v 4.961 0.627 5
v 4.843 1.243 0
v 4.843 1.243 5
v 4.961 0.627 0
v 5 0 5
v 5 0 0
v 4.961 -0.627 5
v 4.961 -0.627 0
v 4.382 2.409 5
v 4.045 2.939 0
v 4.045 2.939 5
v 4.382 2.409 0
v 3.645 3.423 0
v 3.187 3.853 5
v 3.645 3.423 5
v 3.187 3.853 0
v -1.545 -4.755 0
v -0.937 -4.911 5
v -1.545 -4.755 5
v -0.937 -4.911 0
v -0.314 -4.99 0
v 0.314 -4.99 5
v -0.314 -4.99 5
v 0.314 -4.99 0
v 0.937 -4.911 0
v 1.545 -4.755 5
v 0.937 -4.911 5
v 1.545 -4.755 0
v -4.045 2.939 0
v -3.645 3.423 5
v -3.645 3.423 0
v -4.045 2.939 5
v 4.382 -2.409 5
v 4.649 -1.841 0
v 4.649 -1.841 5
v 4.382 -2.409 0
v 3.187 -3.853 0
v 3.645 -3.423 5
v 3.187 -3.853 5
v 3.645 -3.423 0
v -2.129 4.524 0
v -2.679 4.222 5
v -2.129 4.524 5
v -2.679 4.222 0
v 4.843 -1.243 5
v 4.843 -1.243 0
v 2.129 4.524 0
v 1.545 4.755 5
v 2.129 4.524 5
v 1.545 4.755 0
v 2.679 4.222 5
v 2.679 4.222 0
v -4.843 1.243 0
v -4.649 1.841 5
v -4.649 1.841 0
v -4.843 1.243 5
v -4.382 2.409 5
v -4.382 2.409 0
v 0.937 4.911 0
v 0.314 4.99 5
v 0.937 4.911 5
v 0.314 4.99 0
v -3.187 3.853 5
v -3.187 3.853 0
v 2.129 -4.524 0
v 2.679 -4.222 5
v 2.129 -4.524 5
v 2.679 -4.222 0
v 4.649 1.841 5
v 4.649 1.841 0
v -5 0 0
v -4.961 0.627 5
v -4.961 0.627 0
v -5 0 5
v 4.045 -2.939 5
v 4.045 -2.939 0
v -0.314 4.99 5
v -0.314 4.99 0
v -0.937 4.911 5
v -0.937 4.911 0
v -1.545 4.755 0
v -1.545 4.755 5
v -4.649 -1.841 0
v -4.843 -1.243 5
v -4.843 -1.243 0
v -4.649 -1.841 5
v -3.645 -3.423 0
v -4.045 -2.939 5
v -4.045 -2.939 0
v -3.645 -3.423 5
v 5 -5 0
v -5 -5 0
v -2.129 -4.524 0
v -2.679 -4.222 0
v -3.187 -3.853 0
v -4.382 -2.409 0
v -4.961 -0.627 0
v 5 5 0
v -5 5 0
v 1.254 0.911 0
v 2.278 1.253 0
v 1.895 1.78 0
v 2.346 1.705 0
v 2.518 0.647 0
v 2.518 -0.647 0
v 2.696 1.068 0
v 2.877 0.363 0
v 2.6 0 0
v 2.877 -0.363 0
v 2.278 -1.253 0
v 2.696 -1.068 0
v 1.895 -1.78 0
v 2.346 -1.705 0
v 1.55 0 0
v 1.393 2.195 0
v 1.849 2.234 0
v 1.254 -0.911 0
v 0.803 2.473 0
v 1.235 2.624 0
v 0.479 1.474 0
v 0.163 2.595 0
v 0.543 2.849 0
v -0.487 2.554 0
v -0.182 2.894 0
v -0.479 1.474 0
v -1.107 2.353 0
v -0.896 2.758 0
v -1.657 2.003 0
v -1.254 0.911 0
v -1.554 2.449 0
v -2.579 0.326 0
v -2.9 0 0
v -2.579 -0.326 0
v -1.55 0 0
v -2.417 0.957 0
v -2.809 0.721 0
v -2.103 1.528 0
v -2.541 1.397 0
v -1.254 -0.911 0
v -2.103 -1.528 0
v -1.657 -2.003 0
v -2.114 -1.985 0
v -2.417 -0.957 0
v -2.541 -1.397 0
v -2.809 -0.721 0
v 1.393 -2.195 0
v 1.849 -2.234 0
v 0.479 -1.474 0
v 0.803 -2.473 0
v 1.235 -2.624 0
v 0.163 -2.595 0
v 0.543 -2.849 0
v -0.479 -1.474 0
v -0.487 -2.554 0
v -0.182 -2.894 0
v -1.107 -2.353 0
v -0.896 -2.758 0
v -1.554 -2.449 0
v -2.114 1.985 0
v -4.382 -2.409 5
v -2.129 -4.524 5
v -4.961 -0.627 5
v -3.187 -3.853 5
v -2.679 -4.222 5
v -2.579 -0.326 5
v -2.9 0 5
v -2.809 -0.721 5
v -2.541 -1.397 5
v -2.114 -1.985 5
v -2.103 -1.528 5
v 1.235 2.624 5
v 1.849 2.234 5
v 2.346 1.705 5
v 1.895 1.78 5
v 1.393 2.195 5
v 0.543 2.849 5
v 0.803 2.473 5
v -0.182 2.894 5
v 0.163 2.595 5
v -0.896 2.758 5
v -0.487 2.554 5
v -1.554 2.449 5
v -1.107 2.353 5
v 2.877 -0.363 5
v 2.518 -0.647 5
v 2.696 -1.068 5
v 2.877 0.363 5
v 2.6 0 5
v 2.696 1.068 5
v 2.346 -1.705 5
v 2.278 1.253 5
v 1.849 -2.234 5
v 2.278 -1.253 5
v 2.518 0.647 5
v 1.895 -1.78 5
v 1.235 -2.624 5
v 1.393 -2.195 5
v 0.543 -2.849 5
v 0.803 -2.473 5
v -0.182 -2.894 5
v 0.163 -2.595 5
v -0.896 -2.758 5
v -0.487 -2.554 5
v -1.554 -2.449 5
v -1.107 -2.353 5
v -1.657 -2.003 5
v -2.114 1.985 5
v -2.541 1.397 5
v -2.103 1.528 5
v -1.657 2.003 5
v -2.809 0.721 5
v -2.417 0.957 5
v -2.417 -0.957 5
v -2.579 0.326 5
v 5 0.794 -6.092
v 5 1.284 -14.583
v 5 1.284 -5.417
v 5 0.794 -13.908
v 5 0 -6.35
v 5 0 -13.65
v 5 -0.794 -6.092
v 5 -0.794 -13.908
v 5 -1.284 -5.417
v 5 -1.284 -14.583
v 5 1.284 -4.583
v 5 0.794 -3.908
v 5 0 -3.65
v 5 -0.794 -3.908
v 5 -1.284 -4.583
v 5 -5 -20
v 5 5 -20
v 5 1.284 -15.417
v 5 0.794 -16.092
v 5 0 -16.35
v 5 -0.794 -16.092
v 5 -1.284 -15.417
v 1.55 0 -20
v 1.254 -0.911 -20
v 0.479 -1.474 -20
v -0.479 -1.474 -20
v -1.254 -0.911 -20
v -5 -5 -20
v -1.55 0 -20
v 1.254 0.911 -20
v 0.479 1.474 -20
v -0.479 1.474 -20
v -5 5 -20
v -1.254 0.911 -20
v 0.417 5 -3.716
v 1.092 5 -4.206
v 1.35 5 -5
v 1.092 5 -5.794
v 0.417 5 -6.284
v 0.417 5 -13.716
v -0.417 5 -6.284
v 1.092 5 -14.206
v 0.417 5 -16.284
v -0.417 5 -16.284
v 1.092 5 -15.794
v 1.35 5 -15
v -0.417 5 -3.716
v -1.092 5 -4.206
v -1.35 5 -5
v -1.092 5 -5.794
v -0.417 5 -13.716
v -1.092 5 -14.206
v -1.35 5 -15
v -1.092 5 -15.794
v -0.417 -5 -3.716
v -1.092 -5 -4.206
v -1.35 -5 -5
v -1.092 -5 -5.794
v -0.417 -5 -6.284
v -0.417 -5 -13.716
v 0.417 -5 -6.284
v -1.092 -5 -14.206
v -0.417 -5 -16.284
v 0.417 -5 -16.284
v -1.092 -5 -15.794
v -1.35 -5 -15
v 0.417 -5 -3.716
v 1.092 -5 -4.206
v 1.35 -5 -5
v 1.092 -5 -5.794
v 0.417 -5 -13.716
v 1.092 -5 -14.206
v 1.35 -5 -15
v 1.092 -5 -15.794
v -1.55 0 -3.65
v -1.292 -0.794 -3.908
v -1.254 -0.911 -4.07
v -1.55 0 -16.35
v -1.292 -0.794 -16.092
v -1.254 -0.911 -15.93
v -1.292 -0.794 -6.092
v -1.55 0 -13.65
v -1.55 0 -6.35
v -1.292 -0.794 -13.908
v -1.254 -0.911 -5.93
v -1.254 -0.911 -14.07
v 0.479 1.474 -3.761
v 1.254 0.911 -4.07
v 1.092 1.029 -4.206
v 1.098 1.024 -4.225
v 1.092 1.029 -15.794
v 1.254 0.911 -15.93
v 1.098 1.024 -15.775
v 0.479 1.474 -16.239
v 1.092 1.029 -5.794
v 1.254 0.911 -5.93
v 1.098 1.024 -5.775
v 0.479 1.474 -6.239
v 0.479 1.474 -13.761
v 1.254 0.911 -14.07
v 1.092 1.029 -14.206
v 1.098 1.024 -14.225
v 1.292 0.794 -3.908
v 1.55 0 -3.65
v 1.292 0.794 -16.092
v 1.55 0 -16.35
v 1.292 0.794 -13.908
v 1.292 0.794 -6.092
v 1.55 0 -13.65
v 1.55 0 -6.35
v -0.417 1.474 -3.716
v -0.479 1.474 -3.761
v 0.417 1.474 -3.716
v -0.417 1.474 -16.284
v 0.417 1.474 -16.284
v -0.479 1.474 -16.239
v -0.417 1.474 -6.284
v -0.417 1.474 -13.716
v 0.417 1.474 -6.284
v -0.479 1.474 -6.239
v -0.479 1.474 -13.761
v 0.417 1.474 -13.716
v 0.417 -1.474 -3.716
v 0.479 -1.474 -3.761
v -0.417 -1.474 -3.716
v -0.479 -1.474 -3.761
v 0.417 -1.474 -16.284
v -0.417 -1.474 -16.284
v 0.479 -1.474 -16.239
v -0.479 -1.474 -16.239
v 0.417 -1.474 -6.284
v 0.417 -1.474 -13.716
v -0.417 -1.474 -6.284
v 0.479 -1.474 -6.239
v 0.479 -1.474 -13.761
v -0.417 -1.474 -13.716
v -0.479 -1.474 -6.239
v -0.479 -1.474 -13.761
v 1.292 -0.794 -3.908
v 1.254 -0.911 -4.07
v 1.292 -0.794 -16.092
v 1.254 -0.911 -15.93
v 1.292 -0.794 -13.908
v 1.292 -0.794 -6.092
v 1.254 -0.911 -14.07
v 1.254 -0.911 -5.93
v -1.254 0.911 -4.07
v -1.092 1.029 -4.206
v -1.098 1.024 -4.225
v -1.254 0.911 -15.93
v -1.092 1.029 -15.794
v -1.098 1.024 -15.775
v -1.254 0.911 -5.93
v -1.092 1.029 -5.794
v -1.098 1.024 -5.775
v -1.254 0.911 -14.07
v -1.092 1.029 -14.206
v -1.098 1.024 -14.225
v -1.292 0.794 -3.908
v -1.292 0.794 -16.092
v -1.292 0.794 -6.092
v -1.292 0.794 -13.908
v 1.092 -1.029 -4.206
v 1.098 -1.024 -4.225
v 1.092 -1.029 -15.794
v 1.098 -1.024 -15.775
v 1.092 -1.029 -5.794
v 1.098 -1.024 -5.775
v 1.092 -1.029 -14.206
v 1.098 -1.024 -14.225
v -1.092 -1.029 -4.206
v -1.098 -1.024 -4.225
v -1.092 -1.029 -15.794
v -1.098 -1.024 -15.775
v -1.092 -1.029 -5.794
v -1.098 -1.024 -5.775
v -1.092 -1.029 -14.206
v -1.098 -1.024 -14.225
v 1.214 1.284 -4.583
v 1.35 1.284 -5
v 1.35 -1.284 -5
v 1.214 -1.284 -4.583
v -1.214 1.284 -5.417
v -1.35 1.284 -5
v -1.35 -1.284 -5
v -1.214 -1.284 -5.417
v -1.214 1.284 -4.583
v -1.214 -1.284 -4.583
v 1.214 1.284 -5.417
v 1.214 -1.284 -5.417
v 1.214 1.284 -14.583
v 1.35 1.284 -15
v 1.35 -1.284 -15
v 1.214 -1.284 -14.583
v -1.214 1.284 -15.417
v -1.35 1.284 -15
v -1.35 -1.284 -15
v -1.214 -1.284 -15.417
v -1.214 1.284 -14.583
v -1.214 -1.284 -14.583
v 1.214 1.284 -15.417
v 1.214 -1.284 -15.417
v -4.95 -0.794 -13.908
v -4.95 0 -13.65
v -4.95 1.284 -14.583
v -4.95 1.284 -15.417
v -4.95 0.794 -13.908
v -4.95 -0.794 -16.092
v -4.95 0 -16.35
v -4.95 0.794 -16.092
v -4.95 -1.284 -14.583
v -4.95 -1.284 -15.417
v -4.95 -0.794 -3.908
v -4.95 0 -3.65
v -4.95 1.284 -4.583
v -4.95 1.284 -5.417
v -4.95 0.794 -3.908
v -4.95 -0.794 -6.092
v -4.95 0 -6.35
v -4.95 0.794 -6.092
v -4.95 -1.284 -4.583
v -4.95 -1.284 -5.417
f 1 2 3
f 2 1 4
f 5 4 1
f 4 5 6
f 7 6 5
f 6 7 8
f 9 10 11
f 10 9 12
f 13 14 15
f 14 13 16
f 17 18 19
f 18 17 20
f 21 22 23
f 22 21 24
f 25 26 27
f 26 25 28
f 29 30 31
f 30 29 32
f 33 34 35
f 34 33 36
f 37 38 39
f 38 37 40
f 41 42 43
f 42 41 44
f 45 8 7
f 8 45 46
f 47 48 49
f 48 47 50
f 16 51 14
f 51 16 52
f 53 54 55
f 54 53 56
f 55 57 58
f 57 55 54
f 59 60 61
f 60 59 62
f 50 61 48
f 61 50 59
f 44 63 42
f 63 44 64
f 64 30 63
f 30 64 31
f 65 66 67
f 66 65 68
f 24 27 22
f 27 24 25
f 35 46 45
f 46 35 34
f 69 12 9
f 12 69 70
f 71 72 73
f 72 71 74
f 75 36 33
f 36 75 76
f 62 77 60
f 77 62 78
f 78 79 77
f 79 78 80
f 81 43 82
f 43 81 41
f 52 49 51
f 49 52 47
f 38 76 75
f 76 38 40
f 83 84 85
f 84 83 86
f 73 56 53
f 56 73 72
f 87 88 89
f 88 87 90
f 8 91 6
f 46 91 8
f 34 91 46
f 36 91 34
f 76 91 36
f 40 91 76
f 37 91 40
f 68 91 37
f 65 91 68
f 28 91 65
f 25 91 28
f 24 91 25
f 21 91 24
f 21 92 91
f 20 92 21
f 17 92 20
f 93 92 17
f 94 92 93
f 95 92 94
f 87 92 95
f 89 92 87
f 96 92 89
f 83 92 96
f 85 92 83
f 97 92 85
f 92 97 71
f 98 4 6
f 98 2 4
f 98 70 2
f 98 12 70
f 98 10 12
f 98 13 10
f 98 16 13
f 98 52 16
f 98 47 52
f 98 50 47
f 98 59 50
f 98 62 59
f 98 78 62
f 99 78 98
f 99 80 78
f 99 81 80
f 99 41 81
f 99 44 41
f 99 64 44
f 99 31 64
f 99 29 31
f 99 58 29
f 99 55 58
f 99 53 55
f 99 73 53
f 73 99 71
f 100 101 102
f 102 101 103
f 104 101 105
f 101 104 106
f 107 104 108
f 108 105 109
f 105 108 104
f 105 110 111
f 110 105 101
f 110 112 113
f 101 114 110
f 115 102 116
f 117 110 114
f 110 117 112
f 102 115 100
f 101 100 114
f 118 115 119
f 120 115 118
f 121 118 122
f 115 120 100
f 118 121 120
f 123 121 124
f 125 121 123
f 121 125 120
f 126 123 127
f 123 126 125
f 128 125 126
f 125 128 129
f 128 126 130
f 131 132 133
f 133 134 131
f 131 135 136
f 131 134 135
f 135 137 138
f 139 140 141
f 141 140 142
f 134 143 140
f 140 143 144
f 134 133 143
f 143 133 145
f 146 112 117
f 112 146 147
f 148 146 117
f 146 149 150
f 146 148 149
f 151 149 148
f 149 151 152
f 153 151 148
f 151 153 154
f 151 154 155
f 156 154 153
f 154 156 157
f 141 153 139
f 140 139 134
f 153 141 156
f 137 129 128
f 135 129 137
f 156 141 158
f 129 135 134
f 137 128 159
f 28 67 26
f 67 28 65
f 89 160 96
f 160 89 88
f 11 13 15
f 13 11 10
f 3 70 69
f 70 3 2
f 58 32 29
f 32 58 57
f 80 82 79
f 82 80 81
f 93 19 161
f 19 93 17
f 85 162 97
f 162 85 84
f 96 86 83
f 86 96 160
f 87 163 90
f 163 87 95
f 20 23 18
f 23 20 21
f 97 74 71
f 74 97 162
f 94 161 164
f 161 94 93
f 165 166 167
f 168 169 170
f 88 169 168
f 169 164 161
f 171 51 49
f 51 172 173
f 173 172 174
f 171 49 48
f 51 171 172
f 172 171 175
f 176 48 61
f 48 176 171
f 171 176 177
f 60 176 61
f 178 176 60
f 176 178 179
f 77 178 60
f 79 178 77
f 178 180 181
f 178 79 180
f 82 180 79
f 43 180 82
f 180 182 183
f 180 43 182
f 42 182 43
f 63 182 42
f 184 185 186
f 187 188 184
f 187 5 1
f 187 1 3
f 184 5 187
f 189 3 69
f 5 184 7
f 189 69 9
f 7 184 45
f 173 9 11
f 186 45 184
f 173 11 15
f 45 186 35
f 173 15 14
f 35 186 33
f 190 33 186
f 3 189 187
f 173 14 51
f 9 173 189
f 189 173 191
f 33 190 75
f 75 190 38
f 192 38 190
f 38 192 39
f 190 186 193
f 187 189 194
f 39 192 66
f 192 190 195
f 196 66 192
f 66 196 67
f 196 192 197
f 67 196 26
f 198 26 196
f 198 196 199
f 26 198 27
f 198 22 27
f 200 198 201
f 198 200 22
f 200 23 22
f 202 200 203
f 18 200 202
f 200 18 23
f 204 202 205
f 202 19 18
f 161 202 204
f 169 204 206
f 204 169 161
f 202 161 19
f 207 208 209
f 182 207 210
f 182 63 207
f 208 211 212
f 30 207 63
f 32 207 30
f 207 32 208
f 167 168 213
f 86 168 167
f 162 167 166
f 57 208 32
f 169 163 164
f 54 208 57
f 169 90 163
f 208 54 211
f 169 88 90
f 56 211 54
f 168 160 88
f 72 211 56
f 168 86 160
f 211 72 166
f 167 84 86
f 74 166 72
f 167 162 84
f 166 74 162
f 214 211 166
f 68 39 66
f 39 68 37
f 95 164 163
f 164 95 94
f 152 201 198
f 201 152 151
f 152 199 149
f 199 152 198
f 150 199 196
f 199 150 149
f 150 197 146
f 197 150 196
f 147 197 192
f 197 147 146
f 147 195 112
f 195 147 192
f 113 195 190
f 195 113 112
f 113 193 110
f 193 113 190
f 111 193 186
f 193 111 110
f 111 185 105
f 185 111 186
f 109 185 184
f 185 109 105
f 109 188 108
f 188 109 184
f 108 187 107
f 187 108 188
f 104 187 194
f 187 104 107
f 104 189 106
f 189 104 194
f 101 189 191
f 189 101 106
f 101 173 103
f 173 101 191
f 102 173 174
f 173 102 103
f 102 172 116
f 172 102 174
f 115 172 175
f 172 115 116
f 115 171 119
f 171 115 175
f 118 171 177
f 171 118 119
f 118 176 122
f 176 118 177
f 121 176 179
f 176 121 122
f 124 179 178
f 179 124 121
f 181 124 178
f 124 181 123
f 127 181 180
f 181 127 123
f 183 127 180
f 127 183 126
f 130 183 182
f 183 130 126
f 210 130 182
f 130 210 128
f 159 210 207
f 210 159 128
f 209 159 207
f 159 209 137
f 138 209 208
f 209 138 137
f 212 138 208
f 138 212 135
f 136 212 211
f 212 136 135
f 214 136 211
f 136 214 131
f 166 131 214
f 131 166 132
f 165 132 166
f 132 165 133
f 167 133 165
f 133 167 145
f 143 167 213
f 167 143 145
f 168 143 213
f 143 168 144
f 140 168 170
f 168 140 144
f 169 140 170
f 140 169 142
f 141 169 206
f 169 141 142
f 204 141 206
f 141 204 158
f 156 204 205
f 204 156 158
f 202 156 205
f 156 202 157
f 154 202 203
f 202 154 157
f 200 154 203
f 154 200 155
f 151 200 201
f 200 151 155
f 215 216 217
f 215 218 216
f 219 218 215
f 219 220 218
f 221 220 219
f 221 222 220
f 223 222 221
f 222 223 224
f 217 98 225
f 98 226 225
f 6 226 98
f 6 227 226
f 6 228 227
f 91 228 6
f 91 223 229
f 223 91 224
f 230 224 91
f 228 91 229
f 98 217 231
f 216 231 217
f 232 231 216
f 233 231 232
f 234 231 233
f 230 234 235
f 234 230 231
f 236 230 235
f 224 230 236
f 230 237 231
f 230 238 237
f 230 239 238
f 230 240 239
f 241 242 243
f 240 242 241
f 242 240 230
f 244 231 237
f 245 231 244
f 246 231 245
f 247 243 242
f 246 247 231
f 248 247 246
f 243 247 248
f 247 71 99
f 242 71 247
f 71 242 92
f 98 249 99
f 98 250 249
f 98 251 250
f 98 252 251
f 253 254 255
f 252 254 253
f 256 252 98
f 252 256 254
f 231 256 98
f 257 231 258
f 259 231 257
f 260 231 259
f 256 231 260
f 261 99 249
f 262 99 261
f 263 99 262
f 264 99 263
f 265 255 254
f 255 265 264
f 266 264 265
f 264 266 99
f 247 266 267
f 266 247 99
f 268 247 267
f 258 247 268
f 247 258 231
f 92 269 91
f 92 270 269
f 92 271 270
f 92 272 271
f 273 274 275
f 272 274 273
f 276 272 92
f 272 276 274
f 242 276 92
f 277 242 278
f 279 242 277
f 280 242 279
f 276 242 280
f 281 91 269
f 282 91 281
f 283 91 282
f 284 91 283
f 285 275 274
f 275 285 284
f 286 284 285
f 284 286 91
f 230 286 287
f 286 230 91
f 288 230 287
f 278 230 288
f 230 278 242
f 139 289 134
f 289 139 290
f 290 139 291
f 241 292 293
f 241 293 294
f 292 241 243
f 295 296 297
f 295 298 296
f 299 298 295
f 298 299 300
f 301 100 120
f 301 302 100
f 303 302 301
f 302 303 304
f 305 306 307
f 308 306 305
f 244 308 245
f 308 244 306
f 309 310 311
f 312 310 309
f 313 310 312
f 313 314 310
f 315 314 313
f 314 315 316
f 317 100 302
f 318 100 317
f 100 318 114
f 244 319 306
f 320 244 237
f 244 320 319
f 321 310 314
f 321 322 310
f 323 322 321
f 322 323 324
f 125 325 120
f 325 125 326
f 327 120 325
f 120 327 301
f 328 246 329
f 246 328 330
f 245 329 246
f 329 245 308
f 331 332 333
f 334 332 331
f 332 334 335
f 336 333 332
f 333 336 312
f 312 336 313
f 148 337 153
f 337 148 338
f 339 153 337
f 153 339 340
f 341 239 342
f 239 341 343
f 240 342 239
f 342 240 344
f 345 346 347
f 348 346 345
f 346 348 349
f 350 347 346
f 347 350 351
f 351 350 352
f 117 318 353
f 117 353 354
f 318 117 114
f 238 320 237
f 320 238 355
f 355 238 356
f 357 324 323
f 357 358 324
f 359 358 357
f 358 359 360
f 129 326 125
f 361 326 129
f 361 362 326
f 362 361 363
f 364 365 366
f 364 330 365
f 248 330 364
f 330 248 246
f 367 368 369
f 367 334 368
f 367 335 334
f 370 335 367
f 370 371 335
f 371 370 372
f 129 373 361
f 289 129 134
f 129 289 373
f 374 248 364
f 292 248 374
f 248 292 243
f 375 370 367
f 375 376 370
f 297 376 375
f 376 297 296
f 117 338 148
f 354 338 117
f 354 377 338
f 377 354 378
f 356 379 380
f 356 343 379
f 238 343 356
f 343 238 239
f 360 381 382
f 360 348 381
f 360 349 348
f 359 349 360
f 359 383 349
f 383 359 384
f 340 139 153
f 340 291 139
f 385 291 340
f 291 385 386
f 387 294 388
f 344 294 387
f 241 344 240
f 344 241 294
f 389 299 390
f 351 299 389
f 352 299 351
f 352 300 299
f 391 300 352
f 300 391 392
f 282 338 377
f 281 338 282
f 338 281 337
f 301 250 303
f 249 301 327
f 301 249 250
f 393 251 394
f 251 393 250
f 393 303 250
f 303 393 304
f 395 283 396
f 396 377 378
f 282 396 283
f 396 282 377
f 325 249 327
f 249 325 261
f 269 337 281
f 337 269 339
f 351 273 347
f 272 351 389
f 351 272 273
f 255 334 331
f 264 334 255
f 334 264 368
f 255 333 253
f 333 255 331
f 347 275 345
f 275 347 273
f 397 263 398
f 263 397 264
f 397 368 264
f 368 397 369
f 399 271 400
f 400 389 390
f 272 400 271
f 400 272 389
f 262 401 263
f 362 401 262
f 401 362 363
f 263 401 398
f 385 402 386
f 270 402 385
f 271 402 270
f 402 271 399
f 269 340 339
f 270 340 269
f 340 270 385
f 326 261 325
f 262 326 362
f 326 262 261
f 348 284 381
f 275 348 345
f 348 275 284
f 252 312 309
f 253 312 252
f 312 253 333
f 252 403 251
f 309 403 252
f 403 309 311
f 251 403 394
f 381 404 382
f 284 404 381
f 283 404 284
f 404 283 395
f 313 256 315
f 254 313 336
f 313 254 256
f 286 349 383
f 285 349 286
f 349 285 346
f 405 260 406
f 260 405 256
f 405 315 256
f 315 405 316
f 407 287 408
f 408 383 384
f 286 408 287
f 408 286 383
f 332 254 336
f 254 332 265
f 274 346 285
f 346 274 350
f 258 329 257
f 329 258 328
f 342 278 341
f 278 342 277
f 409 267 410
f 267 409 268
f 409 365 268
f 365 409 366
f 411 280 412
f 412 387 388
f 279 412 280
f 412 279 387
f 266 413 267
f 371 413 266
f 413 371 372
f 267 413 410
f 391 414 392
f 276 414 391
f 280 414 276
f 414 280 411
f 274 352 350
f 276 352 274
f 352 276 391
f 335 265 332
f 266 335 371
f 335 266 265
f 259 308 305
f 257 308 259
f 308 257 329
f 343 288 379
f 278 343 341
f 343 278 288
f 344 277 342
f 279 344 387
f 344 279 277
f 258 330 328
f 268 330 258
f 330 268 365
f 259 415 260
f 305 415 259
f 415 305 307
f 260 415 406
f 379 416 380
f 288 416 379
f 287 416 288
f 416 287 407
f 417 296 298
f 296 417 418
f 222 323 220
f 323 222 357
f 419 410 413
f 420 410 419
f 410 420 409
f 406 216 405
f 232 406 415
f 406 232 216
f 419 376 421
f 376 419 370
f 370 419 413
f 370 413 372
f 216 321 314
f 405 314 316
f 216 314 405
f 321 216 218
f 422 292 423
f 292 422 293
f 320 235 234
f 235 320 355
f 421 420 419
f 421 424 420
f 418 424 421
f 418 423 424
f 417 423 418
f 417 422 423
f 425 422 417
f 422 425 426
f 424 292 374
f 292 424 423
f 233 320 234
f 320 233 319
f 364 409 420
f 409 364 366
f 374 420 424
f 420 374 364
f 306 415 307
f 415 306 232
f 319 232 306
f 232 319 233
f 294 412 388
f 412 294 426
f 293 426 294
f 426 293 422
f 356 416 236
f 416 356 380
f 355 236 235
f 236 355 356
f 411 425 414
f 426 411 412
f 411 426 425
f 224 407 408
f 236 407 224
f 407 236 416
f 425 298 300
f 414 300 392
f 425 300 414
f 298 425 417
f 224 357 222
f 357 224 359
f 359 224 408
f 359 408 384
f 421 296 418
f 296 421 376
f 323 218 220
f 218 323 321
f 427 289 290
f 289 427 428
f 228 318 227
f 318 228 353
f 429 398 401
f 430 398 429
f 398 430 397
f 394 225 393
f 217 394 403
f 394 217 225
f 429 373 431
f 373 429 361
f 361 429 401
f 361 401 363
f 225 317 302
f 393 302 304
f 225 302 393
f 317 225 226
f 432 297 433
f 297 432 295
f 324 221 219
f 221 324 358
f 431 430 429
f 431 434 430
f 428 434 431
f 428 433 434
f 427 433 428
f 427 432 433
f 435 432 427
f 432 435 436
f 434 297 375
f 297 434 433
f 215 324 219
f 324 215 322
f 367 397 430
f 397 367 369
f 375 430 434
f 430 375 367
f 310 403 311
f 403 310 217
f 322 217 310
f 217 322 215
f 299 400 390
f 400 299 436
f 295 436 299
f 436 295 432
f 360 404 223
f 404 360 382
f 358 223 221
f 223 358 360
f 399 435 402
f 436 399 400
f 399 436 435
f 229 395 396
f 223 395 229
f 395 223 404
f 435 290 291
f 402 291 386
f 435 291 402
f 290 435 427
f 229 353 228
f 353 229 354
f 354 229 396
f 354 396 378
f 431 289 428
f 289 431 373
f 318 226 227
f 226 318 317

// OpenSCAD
// file: servos_data.scad
// datafor misc servo related files

B25T_data = [
  5.8/2,
  5.8/2-0.3,
  25
];
// file: servo_head1.scad
// modules for misc servo related files

module servo_gear( len, da )
{
  r1 = da[0];
  r2 = da[1];
  n  = da[2];

  ang1 = 180 / n; // 360 / (2*n)
  po1 = [
    for( a = [0 : 2*n-1])
      [ ((a%2)?r1:r2)*cos(a*ang1), ((a%2)?r1:r2)*sin(a*ang1) ],
  ];

  linear_extrude( len+0.05 )
   polygon( points=po1, convexity=50 );
}



module servo_head( len, da, r3 = 4.0 )
{
  difference(){
    cylinder( len, r3, r3, $fn=50 );
    servo_gear( len, da );
  };
}

// test
servo_head( 5.0, B25T_data, 5.0 );
// main file
// special extender for servo
use <servo_head1.scad>
include <servos_data.scad>

$fn=52;
ov=0.05;
ov2 = 2*ov;
ge_len = 5.0;
drill_r = 2.7 / 2;
axe_r   = 3.1 / 2;

union() {
  servo_head( ge_len, B25T_data, 5.0 );
  difference() {
    translate( [0,0,-10] )  cube( [10,10,20], center=true );
    #translate( [0,0,-20-ov] )  cylinder( h=20+4*ov, r=axe_r, $fn=10 );
    translate( [0,5+ov, -5] )  rotate( [90,0,0] ) cylinder( h=10+ov2, r=drill_r, $fn=10 );
    translate( [0,5+ov,-15] )  rotate( [90,0,0] ) cylinder( h=10+ov2, r=drill_r, $fn=10 );
    translate( [-5+ov,0,-15] ) rotate( [0,90,0] ) cylinder( h=10+ov2, r=drill_r, $fn=10 );
    translate( [-5+ov,0,-5] )  rotate( [0,90,0] ) cylinder( h=10+ov2, r=drill_r, $fn=10 );
  }
}
